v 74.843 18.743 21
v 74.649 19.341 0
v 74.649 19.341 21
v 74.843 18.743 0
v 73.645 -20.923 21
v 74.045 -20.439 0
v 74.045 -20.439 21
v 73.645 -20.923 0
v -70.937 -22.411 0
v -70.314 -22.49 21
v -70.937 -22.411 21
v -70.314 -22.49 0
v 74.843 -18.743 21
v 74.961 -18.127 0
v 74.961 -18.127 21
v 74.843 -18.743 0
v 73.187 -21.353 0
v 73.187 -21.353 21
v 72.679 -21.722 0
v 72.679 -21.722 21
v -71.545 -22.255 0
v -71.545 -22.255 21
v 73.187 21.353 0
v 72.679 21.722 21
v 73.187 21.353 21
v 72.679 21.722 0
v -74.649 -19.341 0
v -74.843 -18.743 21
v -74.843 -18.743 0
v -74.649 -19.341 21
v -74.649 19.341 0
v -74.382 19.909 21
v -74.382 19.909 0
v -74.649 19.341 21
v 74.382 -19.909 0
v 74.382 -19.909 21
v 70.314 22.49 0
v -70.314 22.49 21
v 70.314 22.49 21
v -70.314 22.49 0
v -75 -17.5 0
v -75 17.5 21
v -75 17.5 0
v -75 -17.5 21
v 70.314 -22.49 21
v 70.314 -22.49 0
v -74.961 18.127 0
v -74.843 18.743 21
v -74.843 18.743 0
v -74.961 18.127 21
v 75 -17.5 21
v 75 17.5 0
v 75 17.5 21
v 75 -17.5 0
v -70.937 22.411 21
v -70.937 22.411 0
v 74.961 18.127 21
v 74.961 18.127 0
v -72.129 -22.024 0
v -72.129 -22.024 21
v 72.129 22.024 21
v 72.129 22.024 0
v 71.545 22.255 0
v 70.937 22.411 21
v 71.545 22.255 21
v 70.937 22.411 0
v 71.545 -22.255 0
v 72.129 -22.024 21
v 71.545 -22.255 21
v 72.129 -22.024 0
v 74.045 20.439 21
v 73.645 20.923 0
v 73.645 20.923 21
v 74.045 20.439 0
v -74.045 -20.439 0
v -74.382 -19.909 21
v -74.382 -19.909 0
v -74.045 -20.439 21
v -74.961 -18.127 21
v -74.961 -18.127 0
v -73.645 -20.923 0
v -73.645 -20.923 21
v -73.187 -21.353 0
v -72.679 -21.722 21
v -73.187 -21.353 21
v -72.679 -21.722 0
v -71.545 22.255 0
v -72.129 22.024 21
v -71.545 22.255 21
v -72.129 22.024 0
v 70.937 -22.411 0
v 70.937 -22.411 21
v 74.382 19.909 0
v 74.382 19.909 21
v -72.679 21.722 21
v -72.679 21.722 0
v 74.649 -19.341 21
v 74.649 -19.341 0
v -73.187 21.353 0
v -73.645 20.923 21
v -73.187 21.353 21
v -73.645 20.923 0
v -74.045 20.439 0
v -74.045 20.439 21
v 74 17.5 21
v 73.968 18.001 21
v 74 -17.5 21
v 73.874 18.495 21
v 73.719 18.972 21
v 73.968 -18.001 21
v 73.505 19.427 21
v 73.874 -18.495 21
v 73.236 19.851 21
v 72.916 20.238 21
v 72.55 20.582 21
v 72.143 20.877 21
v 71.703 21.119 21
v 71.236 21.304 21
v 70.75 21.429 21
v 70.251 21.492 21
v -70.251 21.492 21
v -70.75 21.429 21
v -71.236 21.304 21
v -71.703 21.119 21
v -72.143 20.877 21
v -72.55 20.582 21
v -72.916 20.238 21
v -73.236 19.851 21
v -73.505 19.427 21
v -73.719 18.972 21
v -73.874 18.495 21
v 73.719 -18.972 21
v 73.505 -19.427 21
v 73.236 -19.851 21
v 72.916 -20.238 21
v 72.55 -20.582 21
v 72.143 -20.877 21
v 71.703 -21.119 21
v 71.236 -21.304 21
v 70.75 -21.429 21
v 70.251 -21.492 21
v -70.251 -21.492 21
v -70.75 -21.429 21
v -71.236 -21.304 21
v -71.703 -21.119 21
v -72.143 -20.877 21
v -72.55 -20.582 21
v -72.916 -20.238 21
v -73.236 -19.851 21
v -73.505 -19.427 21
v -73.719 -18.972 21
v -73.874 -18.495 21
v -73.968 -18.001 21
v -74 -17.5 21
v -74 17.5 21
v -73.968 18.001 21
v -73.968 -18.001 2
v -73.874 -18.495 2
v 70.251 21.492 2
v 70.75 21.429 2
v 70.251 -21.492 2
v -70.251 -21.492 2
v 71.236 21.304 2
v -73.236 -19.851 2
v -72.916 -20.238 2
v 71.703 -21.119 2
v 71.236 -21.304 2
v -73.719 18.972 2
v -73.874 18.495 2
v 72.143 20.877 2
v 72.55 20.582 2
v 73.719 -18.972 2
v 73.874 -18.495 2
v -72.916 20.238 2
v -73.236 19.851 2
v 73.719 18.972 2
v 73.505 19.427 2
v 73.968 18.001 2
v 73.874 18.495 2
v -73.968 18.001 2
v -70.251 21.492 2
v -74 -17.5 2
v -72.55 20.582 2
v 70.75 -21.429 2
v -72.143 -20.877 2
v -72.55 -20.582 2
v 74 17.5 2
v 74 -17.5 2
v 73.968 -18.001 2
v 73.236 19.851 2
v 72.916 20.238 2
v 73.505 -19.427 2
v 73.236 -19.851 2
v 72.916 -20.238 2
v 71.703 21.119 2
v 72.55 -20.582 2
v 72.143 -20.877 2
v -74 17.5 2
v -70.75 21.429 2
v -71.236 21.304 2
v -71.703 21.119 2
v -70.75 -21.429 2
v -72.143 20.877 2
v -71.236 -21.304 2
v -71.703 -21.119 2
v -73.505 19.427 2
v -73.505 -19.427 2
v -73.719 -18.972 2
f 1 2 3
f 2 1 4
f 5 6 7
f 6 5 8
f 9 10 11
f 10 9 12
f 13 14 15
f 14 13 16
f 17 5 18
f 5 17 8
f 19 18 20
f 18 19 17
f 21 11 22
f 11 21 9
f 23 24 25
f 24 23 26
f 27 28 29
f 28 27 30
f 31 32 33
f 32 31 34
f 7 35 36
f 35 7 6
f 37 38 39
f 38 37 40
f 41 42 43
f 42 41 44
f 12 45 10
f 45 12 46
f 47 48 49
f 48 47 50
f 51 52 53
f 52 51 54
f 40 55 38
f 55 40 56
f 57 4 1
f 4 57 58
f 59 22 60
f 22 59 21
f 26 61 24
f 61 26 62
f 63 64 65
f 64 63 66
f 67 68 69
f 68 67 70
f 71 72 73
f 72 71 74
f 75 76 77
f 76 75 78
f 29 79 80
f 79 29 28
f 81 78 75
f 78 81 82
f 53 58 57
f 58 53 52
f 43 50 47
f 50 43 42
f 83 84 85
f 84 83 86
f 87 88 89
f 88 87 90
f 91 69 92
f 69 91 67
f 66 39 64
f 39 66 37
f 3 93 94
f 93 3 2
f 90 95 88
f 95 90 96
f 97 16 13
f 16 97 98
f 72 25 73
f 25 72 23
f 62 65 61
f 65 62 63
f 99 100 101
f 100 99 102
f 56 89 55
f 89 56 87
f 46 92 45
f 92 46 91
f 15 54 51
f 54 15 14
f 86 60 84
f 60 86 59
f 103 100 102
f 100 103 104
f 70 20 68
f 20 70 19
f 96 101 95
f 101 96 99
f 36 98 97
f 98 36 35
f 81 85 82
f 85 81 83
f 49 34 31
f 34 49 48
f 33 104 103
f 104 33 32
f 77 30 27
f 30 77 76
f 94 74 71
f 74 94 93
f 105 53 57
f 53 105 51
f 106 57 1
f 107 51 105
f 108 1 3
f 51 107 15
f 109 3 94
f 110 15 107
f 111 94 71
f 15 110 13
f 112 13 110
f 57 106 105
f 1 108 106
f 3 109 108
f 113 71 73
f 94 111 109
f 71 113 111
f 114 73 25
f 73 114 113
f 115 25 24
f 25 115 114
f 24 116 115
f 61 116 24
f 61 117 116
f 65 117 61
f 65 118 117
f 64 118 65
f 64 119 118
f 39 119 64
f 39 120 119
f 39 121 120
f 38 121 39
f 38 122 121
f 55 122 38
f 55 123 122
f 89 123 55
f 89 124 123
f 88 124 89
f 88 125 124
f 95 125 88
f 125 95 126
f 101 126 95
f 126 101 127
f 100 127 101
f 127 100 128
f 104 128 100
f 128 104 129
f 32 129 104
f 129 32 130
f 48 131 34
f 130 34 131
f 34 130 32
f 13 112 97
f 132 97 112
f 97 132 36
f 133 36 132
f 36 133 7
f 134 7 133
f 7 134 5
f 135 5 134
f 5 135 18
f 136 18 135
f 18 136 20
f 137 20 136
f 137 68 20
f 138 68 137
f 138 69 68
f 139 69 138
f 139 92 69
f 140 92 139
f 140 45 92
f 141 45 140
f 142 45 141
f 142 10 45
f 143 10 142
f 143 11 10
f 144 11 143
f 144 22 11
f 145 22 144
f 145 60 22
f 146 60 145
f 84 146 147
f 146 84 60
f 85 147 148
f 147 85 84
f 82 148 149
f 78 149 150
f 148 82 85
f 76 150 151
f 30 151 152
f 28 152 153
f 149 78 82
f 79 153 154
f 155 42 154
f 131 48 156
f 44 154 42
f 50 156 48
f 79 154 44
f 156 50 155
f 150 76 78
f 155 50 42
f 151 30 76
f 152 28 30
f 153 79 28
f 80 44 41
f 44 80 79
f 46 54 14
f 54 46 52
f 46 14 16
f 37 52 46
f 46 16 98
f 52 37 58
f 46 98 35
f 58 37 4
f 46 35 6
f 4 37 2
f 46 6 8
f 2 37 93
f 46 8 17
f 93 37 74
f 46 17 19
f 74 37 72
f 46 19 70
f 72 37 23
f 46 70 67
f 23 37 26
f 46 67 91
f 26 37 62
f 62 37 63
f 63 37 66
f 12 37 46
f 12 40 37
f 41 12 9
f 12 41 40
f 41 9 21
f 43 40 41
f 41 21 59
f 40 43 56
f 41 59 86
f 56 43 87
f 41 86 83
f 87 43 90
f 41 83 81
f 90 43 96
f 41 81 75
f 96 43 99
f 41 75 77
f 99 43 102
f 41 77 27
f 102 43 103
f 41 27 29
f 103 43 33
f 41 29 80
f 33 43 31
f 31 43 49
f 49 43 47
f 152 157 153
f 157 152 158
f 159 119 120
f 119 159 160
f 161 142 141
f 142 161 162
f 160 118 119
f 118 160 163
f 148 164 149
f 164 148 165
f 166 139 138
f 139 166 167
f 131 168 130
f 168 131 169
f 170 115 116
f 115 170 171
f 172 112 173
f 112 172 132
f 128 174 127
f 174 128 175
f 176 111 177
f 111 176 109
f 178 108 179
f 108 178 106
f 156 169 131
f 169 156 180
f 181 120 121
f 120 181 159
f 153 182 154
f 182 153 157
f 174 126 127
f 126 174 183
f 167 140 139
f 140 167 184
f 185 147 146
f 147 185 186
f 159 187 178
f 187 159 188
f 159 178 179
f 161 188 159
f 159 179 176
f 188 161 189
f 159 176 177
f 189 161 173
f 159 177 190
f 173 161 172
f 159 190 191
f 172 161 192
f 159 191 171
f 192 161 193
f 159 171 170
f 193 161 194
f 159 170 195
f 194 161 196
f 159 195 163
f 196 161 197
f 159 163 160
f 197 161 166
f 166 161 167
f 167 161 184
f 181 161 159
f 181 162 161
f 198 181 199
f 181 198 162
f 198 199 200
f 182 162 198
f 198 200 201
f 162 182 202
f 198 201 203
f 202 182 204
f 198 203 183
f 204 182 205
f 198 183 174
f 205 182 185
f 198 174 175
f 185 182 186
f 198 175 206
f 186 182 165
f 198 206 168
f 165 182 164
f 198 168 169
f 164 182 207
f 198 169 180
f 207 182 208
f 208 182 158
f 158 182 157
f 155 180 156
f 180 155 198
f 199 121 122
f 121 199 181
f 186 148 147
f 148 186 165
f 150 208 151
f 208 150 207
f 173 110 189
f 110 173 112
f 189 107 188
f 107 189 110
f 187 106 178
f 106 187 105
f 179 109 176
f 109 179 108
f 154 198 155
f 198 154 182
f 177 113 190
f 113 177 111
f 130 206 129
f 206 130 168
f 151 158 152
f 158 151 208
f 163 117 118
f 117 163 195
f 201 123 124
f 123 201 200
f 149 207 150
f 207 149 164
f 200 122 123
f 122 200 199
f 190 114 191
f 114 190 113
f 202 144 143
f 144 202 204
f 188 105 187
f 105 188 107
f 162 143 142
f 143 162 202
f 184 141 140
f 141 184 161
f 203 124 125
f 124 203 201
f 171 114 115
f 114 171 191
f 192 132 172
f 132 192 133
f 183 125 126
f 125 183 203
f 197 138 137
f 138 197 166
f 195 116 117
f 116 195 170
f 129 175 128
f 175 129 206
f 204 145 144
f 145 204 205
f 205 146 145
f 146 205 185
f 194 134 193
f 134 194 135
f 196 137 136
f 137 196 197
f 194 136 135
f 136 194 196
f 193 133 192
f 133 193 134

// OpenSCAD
$fn = 50;


difference() {
	union() {
		hull() {
			translate(v = [-70.0000000000, 17.5000000000, 0]) {
				cylinder(h = 21, r = 5);
			}
			translate(v = [70.0000000000, 17.5000000000, 0]) {
				cylinder(h = 21, r = 5);
			}
			translate(v = [-70.0000000000, -17.5000000000, 0]) {
				cylinder(h = 21, r = 5);
			}
			translate(v = [70.0000000000, -17.5000000000, 0]) {
				cylinder(h = 21, r = 5);
			}
		}
	}
	union() {
		translate(v = [0, 0, 2]) {
			hull() {
				translate(v = [-70.0000000000, 17.5000000000, 0]) {
					cylinder(h = 19, r = 4);
				}
				translate(v = [70.0000000000, 17.5000000000, 0]) {
					cylinder(h = 19, r = 4);
				}
				translate(v = [-70.0000000000, -17.5000000000, 0]) {
					cylinder(h = 19, r = 4);
				}
				translate(v = [70.0000000000, -17.5000000000, 0]) {
					cylinder(h = 19, r = 4);
				}
			}
		}
	}
}
